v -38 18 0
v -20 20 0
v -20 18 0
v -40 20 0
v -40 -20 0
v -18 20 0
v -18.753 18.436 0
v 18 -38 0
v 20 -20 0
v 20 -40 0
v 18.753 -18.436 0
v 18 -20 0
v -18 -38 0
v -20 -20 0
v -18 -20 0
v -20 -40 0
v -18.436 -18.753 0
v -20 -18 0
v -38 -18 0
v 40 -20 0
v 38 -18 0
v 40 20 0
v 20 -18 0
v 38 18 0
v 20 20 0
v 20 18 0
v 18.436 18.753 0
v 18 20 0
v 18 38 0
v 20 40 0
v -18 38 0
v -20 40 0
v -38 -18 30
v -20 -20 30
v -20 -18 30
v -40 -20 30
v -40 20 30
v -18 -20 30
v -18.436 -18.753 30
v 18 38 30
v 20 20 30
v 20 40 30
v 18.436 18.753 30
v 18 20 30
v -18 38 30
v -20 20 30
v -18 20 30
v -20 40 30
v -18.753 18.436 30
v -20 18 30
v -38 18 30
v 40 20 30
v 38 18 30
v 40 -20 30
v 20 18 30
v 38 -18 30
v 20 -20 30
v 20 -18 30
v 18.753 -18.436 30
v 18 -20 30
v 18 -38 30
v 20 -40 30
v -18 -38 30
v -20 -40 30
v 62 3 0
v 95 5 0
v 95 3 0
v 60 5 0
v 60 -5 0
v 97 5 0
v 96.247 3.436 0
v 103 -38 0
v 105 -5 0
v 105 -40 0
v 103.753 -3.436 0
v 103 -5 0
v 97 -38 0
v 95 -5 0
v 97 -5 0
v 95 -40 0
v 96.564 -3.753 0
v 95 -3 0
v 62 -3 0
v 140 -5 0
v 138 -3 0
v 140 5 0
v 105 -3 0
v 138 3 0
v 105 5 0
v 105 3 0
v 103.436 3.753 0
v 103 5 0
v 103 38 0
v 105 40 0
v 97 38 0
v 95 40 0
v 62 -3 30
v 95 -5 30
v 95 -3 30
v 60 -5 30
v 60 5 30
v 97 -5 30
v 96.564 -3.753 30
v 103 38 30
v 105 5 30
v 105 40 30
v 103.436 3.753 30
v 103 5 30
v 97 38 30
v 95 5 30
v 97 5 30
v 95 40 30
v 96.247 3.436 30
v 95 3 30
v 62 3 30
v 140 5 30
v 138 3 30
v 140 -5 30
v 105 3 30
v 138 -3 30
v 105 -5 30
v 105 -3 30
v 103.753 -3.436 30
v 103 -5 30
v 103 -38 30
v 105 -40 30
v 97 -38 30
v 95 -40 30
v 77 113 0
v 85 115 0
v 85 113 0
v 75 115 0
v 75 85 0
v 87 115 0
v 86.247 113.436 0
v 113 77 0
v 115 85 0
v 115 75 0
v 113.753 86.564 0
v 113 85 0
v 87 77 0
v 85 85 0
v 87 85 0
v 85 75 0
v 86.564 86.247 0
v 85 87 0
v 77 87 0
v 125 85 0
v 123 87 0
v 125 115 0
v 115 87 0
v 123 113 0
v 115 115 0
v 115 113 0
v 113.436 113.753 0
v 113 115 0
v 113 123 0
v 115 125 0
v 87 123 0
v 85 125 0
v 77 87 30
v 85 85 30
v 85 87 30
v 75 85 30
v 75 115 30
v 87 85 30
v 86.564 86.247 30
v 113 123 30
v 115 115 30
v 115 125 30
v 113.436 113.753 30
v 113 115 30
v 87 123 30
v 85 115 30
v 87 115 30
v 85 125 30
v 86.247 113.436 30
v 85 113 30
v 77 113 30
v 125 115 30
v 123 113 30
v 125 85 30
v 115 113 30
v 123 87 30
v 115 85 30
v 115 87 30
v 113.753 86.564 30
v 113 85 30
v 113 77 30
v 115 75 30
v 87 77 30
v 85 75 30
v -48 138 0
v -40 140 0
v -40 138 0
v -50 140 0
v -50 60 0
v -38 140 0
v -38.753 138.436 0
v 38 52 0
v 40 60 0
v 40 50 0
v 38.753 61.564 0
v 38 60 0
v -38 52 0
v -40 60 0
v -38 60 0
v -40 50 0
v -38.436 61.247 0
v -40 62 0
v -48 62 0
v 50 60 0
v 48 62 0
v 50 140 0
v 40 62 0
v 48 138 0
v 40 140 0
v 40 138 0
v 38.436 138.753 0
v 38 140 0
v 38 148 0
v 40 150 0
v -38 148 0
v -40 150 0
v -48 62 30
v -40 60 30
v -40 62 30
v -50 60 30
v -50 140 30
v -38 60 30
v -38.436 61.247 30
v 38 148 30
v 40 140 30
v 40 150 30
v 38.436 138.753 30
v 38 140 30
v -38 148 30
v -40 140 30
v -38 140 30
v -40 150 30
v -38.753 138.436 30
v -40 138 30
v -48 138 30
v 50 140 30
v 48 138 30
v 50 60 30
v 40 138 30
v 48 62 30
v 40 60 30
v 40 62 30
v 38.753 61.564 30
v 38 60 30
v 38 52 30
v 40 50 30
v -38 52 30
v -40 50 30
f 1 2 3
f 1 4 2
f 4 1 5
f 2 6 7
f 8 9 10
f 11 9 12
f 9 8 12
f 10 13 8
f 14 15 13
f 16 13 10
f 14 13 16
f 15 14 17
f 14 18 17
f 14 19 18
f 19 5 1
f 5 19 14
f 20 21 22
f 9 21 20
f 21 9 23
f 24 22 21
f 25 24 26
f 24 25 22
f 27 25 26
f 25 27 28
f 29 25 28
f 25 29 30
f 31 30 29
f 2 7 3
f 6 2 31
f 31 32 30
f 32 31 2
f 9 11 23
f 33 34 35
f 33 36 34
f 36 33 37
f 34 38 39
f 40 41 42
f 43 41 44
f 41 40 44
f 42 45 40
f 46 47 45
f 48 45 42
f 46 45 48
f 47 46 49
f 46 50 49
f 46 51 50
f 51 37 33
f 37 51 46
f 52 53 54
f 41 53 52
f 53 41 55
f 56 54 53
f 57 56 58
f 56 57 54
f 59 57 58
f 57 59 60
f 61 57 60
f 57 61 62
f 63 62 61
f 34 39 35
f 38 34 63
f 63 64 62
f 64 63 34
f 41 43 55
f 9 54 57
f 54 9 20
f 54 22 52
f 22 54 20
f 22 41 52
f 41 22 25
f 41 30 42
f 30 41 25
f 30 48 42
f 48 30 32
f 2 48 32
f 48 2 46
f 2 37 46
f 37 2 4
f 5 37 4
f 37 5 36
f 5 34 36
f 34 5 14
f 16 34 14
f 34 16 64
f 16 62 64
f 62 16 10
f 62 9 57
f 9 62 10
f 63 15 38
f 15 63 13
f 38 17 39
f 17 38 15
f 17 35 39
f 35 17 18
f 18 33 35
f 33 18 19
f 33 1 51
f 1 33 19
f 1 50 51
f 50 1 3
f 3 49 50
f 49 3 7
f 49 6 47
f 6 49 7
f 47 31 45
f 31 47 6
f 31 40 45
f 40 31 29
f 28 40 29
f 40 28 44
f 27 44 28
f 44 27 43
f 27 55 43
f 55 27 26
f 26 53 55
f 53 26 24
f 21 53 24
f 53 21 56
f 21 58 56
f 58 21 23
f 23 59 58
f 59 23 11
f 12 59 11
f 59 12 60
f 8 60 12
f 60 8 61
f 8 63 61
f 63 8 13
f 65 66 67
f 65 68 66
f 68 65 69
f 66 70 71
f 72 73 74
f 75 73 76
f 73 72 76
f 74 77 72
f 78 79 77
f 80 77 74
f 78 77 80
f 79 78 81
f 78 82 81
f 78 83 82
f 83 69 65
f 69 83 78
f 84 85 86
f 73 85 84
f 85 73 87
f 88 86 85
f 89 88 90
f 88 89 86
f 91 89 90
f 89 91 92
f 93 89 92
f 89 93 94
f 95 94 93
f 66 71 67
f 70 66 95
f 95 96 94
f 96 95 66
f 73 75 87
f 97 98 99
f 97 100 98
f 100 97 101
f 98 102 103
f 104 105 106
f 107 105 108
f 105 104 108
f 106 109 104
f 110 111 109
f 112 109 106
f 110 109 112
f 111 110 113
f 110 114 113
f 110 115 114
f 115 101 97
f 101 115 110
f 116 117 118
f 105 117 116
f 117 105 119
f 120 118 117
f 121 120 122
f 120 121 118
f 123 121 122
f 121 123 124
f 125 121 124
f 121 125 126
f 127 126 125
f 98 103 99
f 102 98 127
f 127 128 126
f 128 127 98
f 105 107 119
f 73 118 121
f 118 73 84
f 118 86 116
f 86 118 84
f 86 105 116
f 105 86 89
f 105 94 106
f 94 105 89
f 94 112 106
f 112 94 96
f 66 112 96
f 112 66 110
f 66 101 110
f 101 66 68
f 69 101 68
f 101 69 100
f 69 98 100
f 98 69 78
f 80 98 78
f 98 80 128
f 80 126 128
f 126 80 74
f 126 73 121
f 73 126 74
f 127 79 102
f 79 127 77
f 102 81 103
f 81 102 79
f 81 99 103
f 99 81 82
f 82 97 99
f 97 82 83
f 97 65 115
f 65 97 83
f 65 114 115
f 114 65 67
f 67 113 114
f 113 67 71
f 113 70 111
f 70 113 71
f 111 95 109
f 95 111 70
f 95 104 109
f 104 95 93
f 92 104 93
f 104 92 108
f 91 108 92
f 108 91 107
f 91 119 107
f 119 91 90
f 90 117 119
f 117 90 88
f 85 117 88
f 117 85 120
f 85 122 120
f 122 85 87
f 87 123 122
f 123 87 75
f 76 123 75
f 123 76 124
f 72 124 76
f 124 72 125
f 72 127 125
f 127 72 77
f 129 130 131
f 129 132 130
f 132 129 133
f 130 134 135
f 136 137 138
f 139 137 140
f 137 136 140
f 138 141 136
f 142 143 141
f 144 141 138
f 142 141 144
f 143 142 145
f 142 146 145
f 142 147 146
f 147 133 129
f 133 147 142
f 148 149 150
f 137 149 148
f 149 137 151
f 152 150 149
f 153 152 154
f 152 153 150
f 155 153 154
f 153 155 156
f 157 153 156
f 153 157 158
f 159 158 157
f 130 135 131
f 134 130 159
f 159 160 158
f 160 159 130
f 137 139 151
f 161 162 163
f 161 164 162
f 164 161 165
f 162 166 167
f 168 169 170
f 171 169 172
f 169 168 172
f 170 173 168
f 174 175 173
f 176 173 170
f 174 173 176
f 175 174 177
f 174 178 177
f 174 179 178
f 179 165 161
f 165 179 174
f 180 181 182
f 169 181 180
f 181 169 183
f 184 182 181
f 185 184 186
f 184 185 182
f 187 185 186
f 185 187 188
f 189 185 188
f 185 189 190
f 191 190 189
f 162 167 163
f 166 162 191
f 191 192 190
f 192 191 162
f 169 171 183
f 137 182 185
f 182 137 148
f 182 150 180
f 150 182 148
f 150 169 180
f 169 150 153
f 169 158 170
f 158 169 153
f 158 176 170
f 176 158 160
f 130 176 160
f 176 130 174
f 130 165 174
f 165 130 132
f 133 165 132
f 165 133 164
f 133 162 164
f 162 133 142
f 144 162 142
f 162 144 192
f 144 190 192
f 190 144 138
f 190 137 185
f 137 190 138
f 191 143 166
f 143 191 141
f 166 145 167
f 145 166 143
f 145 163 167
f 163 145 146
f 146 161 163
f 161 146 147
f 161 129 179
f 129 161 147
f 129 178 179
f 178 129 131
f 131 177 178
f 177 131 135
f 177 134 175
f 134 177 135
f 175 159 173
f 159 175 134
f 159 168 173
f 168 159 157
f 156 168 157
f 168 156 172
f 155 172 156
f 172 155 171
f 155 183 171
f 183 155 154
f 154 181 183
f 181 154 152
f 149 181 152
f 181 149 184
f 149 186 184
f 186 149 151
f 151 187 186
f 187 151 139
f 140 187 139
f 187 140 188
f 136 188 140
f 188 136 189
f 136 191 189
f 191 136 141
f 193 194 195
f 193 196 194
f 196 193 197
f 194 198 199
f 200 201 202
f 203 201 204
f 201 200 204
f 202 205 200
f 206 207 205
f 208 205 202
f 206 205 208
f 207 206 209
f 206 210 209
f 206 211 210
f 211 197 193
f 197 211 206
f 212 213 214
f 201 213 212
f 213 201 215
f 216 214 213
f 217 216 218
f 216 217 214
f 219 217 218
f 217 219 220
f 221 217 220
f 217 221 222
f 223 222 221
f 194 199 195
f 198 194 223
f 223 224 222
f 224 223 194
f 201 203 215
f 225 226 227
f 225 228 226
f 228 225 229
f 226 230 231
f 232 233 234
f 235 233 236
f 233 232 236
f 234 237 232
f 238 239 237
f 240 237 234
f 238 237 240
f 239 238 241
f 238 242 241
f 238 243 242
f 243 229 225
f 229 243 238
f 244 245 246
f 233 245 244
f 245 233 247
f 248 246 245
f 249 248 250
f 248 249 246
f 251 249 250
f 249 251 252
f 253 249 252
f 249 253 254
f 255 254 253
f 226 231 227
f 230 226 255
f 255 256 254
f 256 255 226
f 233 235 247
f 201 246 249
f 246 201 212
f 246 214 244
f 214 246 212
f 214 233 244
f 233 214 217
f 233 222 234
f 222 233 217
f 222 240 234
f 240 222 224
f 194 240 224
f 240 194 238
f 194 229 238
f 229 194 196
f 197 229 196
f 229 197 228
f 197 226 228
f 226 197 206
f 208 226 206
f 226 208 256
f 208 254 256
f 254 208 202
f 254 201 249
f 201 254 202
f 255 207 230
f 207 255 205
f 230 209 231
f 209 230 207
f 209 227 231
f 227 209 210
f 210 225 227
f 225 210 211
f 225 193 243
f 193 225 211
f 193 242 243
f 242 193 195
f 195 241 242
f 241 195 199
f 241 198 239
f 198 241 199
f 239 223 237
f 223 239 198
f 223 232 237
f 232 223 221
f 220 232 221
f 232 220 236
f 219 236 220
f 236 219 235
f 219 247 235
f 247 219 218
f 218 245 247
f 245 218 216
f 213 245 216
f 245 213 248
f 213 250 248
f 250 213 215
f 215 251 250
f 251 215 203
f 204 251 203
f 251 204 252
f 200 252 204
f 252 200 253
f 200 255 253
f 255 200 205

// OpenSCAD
module cross(width=30, length=100) {
    square([length, width], center=true);
    square([width, length], center=true);
}

linear_extrude(30) {
    difference() {
        cross(40, 80);
        offset(-2) cross(40, 80);
    }
}

translate([100,0,0])linear_extrude(30) {
    difference() {
        cross(10, 80);
        offset(-2) cross(10, 80);
    }
}

translate([100,100,0])linear_extrude(30) {
    difference() {
        cross(30, 50);
        offset(-2) cross(30, 50);
    }
}

translate([0,100,0])linear_extrude(30) {
    difference() {
        cross(100, 80);
        offset(-2) cross(100, 80);
    }
}
